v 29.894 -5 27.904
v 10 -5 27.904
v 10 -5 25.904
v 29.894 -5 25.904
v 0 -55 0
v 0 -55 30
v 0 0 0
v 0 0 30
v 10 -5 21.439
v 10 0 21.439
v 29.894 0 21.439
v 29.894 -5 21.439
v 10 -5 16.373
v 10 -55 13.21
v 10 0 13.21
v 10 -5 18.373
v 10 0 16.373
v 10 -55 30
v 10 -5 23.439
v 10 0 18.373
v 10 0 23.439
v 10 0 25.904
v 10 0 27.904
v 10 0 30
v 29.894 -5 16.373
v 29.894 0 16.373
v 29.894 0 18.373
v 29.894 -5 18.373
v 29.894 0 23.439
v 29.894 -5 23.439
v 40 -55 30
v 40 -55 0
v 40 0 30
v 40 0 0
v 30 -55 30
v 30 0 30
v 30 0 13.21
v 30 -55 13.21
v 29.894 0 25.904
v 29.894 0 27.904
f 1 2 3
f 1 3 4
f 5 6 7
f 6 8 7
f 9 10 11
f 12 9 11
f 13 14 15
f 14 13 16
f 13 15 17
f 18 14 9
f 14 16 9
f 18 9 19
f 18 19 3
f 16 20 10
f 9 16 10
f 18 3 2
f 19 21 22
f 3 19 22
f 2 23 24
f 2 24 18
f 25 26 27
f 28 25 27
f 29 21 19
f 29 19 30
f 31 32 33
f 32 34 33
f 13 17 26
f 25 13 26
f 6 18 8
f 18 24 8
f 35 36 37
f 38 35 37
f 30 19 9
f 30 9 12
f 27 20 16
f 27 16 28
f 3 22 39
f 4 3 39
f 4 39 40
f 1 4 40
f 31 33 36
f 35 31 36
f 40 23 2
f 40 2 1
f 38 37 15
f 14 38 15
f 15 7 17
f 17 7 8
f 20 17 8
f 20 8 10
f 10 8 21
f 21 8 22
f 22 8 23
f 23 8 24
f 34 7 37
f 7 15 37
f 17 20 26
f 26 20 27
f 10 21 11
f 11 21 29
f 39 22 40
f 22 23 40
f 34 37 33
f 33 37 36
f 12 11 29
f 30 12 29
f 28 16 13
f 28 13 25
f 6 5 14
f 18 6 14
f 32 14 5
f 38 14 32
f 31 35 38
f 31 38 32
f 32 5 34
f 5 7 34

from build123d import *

# Parameters (mm, degrees)
F1_DEPTH = 50
F2_DEPTH = 5
F3_W     = 20
F3_H     = 2
F4_DEPTH = 5


with BuildPart() as f1:
    # F0 (on Front) → F1 (new body)
    with BuildSketch(Plane.XZ):
        Polygon((0, 30), (0, 0), (40, 0), (40, 30), (30, 30), (30, 13.209878), (10, 13.209878), (10, 30), align=None)
    extrude(amount=F1_DEPTH)

    # F1_face (on face) → F2 (join)
    with BuildSketch(Plane(origin=(20, -50, 12.43351), x_dir=(1, 0, 0), z_dir=(0, -1, 0))):
        Polygon((10, 0.776368), (-10, 0.776368), (-10, 17.56649), (-20, 17.56649), (-20, -12.43351), (20, -12.43351), (20, 17.56649), (10, 17.56649), align=None)
    extrude(amount=F2_DEPTH)

    # F3 (on Front) → F4 (join)
    with BuildSketch(Plane.XZ):
        with Locations((19.894101, 17.3732)):
            Rectangle(F3_W, F3_H)
        with Locations((19.894101, 22.438831)):
            Rectangle(F3_W, F3_H)
        with Locations((19.894101, 26.903864)):
            Rectangle(F3_W, F3_H)
    extrude(amount=F4_DEPTH)


solid = f1.part
